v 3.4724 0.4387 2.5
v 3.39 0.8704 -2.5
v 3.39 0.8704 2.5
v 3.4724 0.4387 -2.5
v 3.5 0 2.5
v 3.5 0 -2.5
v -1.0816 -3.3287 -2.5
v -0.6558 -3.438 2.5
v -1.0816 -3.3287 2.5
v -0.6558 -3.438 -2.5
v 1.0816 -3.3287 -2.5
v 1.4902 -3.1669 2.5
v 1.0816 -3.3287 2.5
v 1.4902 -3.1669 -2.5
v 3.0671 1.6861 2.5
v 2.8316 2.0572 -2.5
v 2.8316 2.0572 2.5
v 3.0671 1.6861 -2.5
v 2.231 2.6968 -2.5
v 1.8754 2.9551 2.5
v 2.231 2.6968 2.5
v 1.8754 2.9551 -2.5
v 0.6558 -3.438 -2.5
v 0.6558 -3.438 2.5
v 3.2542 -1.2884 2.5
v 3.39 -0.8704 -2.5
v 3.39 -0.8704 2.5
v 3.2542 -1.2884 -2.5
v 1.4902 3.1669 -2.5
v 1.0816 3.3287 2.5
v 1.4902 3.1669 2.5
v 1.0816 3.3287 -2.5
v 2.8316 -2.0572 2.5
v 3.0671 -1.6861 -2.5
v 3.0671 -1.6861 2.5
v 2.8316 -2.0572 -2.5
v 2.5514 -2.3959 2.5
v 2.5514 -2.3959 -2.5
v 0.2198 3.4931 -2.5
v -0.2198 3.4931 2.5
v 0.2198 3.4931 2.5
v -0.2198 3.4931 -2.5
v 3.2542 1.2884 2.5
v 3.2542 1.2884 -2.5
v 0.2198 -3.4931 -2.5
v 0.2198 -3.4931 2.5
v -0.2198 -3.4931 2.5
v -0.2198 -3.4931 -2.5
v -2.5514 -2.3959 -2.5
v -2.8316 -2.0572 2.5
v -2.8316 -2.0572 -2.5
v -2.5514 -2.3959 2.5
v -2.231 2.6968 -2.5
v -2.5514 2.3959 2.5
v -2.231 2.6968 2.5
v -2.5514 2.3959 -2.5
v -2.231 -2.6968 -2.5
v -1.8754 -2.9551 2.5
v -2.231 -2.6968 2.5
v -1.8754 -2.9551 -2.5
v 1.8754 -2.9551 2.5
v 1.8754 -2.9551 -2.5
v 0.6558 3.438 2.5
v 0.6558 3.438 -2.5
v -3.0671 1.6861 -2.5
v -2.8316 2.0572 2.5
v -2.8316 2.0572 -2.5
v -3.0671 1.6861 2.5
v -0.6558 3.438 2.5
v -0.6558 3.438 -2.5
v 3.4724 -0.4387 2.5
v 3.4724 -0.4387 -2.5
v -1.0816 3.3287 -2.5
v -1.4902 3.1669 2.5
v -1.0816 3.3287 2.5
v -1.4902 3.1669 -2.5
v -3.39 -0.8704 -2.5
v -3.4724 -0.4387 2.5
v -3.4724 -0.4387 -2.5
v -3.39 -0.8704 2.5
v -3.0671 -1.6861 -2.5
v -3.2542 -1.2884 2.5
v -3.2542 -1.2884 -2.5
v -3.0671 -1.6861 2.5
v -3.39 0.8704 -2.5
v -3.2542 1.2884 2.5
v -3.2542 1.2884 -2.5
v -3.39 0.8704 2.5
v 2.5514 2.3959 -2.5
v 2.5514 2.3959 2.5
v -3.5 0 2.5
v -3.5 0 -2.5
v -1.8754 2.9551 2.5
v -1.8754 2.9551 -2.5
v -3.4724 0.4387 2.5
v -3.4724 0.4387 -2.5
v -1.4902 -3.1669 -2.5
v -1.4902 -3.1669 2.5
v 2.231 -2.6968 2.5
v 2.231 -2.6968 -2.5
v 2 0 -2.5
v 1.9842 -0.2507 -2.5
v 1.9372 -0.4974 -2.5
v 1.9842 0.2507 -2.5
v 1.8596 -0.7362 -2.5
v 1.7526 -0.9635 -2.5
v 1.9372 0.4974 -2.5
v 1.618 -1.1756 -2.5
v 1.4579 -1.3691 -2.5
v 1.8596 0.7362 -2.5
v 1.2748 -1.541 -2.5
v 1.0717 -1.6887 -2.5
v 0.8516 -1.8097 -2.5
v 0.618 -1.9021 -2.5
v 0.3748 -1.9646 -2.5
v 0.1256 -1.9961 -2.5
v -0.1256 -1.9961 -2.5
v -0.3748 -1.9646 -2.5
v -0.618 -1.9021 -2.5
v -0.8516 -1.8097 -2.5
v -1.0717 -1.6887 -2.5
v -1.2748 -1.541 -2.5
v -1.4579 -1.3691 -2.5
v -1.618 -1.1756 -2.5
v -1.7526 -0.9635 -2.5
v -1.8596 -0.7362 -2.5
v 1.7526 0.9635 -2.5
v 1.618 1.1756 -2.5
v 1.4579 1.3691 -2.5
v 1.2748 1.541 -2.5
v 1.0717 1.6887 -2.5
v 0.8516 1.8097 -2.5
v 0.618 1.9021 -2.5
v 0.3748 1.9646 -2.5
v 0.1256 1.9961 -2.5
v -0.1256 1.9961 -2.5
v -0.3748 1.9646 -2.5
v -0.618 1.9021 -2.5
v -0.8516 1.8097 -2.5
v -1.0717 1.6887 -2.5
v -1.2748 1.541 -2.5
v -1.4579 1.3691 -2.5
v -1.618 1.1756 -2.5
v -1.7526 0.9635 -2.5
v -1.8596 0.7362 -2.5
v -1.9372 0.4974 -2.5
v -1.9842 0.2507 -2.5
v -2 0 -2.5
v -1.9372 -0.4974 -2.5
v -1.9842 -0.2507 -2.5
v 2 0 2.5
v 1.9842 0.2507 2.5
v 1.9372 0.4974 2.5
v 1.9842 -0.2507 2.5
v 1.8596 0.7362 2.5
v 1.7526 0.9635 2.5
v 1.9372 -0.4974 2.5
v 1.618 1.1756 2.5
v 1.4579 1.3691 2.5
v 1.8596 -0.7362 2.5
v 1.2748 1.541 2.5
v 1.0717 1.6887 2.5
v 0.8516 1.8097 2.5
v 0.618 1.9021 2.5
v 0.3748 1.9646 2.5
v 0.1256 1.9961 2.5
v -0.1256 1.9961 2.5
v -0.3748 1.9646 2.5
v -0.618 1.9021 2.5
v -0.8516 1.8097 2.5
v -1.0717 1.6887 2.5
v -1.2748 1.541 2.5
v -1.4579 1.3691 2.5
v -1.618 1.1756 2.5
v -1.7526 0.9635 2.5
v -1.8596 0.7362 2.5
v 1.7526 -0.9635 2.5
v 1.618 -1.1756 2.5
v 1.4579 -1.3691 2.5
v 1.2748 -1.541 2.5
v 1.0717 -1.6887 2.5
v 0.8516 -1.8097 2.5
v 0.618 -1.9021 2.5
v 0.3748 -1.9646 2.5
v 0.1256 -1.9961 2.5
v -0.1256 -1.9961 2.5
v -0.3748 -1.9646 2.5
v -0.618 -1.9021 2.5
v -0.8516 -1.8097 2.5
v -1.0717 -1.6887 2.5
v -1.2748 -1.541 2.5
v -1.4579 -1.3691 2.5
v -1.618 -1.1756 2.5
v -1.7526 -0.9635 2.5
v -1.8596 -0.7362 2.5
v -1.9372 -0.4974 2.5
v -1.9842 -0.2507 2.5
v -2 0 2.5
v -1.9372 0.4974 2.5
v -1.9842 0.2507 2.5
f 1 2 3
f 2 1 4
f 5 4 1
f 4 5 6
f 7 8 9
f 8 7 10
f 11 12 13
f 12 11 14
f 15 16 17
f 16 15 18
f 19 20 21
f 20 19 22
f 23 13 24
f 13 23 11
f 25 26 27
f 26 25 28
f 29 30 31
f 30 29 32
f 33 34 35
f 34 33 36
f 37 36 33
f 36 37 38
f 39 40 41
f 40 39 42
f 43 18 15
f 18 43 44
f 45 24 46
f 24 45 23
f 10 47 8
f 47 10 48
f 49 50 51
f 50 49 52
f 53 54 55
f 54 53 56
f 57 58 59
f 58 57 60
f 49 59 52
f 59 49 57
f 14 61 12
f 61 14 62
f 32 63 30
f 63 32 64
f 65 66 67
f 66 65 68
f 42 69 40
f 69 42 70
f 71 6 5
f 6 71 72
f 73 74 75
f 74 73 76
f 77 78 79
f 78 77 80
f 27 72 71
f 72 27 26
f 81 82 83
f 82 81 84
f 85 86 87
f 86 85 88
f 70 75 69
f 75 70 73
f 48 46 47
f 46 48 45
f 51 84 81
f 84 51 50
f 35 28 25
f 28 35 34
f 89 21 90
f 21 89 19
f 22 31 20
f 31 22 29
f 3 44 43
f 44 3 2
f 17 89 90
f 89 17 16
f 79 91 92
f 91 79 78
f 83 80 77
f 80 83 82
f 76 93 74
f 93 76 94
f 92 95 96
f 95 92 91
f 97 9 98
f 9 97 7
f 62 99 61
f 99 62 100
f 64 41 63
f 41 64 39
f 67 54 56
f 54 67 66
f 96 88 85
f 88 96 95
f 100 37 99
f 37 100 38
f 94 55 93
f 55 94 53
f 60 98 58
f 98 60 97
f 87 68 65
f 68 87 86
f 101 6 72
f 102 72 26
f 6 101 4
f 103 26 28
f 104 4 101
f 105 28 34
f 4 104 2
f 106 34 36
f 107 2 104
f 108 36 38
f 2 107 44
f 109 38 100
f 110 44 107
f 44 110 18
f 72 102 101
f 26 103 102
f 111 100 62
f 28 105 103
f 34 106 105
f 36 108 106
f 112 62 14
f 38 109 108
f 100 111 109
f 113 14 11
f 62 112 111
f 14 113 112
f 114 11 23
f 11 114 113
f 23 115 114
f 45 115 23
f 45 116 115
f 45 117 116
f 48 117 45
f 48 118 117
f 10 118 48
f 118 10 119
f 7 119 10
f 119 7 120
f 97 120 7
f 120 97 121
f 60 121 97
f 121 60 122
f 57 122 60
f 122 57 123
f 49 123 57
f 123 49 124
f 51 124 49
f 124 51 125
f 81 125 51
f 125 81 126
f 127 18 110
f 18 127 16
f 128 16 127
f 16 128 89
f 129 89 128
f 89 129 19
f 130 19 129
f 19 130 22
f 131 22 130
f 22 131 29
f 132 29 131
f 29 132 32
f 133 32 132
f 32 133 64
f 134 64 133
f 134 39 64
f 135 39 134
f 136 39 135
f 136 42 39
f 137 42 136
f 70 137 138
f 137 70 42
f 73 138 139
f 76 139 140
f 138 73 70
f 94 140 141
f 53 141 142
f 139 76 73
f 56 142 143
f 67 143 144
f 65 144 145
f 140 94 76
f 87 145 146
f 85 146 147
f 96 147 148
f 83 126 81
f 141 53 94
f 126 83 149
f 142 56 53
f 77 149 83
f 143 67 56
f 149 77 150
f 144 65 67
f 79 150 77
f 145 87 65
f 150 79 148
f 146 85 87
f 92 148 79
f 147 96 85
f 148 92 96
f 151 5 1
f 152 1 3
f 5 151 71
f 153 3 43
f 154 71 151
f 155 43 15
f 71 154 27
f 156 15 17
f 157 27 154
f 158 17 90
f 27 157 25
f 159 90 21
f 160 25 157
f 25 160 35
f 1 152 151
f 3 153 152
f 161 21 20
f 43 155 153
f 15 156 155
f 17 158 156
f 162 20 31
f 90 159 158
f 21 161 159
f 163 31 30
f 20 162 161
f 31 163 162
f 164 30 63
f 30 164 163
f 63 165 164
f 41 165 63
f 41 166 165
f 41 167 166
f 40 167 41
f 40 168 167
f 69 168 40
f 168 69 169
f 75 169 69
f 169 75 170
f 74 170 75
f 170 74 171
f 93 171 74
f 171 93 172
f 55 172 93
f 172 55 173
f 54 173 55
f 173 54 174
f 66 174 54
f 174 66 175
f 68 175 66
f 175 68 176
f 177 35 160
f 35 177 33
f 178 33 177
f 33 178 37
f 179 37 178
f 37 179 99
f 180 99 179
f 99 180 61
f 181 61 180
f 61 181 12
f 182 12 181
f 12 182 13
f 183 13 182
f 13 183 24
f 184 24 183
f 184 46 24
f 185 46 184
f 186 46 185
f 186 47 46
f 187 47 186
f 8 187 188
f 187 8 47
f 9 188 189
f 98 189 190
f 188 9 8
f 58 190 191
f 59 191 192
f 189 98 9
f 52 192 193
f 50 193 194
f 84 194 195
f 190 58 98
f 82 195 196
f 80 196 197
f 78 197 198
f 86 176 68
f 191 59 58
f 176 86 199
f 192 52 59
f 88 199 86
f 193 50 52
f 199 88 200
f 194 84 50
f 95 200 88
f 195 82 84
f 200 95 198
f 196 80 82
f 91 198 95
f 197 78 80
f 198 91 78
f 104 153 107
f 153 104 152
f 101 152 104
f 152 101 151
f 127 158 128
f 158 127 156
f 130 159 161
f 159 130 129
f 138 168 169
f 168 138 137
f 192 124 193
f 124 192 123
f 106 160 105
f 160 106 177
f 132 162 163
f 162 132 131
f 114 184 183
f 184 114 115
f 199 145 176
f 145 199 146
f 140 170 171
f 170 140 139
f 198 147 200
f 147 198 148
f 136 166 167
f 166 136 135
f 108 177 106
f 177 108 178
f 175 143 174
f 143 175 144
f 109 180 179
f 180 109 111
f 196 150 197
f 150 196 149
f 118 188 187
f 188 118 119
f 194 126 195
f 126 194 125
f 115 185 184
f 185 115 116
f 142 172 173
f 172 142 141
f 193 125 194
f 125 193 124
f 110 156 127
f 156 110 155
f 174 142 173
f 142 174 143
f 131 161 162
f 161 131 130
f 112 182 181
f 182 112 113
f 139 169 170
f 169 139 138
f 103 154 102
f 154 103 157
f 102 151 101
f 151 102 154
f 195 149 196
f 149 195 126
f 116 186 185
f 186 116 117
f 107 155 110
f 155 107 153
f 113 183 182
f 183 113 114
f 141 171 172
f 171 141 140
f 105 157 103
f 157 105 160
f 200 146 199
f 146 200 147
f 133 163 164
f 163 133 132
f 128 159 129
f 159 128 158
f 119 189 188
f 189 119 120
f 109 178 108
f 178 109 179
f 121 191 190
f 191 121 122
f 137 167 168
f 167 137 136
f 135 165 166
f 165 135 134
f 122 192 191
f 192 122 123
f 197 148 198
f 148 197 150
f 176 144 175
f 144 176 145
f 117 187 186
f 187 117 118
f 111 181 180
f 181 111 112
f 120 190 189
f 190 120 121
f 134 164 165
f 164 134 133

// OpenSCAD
$fn = 50;


difference() {
	union() {
		translate(v = [0, 0, -2.5000000000]) {
			cylinder(h = 5, r = 3.5000000000);
		}
	}
	union() {
		translate(v = [0, 0, -100.0000000000]) {
			cylinder(h = 200, r = 2.0000000000);
		}
	}
}
